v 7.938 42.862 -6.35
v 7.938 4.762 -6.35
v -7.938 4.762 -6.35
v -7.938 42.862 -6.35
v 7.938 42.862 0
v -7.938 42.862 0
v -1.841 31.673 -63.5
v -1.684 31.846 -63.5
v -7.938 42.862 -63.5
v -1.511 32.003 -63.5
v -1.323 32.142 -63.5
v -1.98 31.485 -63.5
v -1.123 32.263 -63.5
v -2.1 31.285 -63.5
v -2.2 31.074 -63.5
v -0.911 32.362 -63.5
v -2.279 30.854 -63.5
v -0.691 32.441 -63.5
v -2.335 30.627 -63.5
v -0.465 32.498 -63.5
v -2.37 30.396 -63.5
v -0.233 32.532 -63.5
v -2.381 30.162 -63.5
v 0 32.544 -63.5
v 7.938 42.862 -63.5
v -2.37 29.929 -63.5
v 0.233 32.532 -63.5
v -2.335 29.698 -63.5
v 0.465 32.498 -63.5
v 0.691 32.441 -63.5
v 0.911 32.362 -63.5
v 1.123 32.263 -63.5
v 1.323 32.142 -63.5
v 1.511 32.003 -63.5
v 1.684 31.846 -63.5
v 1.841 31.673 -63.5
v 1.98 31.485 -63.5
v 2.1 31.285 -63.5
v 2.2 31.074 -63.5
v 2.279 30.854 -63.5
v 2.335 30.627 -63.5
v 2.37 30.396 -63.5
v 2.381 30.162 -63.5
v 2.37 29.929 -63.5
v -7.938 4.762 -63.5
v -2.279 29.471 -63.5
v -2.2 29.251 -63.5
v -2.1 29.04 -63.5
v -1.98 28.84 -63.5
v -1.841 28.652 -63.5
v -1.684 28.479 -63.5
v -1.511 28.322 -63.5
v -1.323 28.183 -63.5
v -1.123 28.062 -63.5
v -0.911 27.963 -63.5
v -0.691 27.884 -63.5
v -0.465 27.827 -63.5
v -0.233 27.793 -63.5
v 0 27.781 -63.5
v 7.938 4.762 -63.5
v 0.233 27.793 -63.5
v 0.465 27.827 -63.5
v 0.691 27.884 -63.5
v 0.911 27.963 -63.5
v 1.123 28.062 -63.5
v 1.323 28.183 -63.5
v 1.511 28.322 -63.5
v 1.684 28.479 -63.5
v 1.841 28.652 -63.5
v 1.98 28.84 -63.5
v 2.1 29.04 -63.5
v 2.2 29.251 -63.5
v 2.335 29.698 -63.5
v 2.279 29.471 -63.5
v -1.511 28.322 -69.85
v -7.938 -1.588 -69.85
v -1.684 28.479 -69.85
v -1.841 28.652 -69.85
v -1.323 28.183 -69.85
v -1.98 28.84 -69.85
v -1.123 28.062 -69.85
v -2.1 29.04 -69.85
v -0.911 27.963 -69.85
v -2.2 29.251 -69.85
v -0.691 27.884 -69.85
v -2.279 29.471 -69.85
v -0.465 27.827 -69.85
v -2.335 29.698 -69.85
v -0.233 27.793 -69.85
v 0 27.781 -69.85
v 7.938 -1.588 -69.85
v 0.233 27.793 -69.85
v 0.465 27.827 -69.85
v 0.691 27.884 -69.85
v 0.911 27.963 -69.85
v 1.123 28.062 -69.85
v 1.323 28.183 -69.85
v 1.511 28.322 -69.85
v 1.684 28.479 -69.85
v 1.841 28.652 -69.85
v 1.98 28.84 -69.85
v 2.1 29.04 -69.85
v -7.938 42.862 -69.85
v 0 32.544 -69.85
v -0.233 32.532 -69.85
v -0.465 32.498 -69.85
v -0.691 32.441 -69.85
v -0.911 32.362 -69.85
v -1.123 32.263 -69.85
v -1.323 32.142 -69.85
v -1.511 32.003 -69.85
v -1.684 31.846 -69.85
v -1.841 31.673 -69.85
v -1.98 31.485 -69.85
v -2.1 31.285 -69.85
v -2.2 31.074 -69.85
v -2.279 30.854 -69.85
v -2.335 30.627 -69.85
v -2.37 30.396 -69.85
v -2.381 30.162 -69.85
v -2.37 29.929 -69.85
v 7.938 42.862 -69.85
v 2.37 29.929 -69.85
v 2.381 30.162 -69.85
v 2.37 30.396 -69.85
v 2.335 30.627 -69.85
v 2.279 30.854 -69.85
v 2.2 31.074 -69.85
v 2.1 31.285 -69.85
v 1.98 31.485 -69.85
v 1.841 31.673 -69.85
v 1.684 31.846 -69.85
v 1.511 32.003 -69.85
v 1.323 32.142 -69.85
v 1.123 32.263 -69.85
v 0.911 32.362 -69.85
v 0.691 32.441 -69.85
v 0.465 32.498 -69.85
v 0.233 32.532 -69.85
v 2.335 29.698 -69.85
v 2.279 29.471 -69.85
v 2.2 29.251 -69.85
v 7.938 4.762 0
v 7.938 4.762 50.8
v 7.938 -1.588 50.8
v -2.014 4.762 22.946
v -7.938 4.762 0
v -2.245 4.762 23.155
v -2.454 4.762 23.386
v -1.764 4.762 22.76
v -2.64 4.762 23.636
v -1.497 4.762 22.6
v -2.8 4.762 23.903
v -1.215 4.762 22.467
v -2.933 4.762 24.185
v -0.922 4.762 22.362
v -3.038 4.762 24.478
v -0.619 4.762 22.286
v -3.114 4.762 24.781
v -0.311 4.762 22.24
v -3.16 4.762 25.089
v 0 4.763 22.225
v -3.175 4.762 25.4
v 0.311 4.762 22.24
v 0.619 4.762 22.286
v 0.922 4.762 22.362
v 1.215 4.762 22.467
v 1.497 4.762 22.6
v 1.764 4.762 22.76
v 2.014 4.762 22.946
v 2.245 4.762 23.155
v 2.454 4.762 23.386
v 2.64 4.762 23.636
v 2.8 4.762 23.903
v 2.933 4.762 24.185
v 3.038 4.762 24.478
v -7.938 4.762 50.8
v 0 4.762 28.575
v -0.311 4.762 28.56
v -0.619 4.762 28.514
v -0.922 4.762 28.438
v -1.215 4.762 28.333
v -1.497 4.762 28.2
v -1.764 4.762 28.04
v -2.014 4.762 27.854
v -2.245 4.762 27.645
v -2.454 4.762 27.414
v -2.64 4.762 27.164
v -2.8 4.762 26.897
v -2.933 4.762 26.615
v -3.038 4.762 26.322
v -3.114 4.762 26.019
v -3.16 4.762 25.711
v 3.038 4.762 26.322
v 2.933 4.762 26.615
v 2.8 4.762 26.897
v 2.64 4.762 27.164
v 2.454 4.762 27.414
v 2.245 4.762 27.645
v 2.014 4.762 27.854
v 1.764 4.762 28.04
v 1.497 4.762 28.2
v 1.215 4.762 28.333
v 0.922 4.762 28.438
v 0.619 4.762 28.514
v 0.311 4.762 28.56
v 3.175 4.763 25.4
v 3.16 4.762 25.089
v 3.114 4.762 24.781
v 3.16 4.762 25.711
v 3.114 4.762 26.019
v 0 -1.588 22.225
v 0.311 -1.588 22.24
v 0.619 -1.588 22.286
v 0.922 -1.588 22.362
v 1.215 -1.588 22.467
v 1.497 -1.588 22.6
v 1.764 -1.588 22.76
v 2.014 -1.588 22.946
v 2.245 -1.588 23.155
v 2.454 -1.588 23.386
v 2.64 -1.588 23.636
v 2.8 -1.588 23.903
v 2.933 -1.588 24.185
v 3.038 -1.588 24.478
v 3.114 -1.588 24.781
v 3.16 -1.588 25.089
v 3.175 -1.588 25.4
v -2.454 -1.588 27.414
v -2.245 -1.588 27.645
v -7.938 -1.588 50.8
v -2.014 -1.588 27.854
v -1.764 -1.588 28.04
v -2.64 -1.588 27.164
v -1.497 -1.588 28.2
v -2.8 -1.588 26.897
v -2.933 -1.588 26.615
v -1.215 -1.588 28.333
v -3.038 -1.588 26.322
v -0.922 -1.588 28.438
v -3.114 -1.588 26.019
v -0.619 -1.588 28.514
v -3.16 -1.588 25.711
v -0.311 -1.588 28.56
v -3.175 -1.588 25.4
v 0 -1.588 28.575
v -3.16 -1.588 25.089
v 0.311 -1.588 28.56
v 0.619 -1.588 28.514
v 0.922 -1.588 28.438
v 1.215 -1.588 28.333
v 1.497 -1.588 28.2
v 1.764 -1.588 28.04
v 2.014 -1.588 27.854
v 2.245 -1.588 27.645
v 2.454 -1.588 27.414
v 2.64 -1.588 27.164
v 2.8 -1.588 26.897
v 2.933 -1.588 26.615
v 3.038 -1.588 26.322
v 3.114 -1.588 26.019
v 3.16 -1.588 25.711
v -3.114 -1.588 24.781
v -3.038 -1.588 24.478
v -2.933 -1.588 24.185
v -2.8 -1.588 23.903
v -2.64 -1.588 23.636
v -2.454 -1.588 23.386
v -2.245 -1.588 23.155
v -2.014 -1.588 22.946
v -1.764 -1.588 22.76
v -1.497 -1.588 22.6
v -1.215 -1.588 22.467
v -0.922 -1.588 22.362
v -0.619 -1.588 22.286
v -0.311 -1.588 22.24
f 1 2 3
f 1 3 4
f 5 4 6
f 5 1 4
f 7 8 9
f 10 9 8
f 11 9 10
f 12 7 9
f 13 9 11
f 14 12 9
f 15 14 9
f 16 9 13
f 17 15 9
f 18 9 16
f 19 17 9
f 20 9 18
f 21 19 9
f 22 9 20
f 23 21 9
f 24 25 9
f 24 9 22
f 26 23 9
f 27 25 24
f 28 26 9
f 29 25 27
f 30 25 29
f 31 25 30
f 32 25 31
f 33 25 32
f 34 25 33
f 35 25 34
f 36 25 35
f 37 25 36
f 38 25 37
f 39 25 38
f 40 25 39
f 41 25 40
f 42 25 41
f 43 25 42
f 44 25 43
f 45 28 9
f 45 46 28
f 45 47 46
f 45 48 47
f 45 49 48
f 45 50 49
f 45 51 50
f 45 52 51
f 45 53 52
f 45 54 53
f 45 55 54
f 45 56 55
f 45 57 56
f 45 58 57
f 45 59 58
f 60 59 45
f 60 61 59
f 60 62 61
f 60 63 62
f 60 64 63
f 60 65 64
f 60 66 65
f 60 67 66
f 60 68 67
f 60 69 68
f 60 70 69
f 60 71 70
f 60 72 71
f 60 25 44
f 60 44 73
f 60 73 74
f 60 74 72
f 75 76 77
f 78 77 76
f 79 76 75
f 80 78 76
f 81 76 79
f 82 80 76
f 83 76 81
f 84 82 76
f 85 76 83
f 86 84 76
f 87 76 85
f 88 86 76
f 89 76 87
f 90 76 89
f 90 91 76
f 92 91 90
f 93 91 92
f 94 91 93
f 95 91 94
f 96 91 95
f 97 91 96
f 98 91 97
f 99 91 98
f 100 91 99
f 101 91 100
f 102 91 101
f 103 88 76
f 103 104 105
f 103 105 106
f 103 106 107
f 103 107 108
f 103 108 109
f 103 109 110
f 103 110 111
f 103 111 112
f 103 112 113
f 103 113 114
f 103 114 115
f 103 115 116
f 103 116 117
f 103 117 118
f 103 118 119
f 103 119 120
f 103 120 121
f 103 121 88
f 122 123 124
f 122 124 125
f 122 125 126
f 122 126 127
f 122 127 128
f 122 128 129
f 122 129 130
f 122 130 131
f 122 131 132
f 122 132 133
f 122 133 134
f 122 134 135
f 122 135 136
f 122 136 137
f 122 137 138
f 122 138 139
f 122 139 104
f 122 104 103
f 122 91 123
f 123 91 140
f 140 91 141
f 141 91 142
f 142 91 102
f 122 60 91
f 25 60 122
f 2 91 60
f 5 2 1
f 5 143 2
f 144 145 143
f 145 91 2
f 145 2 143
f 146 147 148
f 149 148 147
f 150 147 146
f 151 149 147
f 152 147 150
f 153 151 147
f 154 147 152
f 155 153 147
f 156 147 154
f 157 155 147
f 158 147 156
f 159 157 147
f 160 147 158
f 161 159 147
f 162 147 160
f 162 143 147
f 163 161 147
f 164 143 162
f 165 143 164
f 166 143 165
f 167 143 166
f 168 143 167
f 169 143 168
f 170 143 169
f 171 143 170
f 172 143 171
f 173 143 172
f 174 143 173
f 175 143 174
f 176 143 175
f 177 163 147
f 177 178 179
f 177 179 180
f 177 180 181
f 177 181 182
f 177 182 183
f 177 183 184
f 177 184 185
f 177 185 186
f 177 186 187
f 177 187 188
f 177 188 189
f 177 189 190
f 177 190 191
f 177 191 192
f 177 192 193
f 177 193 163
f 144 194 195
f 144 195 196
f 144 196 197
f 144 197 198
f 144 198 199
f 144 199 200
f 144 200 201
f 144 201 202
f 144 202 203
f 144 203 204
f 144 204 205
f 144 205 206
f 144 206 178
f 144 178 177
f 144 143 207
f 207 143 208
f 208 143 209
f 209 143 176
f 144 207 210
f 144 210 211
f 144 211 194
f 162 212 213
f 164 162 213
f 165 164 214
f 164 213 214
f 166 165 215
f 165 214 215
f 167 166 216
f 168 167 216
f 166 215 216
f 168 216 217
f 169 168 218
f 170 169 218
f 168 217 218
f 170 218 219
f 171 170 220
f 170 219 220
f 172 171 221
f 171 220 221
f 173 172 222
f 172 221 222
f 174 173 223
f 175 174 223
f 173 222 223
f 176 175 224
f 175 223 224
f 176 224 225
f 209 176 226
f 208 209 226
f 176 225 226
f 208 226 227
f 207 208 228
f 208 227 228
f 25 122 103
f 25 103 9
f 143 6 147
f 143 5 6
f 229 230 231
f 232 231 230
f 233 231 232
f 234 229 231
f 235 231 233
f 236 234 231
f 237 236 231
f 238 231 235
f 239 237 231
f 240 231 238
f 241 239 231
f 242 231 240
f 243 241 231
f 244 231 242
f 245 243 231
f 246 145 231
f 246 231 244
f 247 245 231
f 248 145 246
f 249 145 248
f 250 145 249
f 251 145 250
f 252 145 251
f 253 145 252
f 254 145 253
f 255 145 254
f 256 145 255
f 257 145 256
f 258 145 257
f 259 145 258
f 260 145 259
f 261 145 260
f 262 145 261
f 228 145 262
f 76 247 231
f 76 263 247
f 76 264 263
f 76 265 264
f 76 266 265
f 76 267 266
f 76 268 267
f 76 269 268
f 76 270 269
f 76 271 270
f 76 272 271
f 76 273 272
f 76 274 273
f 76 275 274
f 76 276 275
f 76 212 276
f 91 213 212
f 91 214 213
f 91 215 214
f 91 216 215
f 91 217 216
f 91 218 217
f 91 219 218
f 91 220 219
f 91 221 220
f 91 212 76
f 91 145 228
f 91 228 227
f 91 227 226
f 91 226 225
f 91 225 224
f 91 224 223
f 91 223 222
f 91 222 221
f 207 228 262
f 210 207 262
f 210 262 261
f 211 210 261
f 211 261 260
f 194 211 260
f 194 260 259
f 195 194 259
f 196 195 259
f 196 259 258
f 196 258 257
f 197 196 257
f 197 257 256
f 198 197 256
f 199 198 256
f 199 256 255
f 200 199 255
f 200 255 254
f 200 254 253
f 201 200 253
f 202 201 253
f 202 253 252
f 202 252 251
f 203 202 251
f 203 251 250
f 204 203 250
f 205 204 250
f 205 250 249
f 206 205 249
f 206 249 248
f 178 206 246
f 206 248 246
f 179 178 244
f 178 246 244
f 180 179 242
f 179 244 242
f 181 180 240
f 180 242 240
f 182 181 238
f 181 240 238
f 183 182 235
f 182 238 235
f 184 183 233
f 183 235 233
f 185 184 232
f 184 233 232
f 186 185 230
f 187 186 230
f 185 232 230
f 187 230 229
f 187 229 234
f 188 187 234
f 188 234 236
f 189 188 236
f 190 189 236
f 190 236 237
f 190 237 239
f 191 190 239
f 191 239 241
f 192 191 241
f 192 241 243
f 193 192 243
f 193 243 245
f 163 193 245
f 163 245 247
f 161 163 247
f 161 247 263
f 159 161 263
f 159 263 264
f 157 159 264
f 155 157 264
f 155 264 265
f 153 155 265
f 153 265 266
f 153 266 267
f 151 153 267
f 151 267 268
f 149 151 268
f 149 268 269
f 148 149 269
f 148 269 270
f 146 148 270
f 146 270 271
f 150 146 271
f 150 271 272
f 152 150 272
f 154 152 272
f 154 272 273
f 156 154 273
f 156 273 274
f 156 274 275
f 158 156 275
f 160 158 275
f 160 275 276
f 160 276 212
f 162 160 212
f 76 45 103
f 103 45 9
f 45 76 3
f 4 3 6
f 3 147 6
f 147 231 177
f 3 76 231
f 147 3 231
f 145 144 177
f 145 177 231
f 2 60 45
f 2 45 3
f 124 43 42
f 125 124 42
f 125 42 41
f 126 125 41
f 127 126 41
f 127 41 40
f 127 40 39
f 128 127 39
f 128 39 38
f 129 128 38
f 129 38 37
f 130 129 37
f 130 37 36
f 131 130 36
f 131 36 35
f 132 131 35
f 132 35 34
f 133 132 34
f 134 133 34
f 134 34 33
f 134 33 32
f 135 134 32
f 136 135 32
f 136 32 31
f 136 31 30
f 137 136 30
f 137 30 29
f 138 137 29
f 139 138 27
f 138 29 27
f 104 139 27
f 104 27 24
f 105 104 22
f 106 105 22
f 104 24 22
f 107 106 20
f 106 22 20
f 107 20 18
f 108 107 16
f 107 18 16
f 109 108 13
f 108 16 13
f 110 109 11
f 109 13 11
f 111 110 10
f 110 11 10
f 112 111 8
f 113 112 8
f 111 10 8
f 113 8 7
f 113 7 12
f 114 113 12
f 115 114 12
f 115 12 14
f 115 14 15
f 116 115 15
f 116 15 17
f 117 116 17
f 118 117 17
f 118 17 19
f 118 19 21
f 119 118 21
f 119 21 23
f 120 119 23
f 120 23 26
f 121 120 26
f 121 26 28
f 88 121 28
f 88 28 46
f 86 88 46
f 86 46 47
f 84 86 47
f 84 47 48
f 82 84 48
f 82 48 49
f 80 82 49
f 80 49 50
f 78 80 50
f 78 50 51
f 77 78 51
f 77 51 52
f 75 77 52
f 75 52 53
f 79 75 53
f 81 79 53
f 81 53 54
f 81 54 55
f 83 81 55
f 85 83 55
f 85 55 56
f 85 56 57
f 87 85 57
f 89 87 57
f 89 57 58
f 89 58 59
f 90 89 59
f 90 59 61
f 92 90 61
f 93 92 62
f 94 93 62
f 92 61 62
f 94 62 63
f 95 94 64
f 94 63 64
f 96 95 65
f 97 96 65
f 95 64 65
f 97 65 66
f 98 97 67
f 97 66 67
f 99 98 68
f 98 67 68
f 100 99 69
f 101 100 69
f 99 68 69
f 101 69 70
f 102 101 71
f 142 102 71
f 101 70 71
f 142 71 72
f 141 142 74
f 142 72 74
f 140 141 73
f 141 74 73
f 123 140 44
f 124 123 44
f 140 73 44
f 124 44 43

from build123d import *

# Parameters (mm, degrees)
F1_DEPTH = 7.9375
F4_DEPTH = 25.4
F5_DEPTH = 25.4


with BuildPart() as f1:
    # F0 (on Right) → F1 (new body, symmetric)
    with BuildSketch(Plane.YZ):
        Polygon((4.7625, 0), (4.7625, 50.8), (-1.5875, 50.8), (-1.5875, 0), (-1.5875, -69.85), (4.7625, -69.85), (42.8625, -69.85), (42.8625, -63.5), (4.7625, -63.5), (4.7625, -6.35), (42.8625, -6.35), (42.8625, 0), align=None)
    extrude(amount=F1_DEPTH, both=True)

    # F3 (on face) → F4 (cut)
    with BuildSketch(Plane.XZ.offset(1.5875)):
        with BuildLine():
            ThreePointArc((0, 22.225), (2.245064, 23.154936), (3.175, 25.4))
            ThreePointArc((3.175, 25.4), (-2.245064, 27.645064), (0, 22.225))
        make_face()
    extrude(amount=-F4_DEPTH, mode=Mode.SUBTRACT)

    # F2 (on face) → F5 (cut)
    with BuildSketch(Plane.XY.offset(-63.5)):
        with BuildLine():
            ThreePointArc((2.38125, 30.1625), (-1.683798, 31.846298), (0, 27.78125))
            ThreePointArc((0, 27.78125), (1.683798, 28.478702), (2.38125, 30.1625))
        make_face()
    extrude(amount=-F5_DEPTH, mode=Mode.SUBTRACT)


solid = f1.part
